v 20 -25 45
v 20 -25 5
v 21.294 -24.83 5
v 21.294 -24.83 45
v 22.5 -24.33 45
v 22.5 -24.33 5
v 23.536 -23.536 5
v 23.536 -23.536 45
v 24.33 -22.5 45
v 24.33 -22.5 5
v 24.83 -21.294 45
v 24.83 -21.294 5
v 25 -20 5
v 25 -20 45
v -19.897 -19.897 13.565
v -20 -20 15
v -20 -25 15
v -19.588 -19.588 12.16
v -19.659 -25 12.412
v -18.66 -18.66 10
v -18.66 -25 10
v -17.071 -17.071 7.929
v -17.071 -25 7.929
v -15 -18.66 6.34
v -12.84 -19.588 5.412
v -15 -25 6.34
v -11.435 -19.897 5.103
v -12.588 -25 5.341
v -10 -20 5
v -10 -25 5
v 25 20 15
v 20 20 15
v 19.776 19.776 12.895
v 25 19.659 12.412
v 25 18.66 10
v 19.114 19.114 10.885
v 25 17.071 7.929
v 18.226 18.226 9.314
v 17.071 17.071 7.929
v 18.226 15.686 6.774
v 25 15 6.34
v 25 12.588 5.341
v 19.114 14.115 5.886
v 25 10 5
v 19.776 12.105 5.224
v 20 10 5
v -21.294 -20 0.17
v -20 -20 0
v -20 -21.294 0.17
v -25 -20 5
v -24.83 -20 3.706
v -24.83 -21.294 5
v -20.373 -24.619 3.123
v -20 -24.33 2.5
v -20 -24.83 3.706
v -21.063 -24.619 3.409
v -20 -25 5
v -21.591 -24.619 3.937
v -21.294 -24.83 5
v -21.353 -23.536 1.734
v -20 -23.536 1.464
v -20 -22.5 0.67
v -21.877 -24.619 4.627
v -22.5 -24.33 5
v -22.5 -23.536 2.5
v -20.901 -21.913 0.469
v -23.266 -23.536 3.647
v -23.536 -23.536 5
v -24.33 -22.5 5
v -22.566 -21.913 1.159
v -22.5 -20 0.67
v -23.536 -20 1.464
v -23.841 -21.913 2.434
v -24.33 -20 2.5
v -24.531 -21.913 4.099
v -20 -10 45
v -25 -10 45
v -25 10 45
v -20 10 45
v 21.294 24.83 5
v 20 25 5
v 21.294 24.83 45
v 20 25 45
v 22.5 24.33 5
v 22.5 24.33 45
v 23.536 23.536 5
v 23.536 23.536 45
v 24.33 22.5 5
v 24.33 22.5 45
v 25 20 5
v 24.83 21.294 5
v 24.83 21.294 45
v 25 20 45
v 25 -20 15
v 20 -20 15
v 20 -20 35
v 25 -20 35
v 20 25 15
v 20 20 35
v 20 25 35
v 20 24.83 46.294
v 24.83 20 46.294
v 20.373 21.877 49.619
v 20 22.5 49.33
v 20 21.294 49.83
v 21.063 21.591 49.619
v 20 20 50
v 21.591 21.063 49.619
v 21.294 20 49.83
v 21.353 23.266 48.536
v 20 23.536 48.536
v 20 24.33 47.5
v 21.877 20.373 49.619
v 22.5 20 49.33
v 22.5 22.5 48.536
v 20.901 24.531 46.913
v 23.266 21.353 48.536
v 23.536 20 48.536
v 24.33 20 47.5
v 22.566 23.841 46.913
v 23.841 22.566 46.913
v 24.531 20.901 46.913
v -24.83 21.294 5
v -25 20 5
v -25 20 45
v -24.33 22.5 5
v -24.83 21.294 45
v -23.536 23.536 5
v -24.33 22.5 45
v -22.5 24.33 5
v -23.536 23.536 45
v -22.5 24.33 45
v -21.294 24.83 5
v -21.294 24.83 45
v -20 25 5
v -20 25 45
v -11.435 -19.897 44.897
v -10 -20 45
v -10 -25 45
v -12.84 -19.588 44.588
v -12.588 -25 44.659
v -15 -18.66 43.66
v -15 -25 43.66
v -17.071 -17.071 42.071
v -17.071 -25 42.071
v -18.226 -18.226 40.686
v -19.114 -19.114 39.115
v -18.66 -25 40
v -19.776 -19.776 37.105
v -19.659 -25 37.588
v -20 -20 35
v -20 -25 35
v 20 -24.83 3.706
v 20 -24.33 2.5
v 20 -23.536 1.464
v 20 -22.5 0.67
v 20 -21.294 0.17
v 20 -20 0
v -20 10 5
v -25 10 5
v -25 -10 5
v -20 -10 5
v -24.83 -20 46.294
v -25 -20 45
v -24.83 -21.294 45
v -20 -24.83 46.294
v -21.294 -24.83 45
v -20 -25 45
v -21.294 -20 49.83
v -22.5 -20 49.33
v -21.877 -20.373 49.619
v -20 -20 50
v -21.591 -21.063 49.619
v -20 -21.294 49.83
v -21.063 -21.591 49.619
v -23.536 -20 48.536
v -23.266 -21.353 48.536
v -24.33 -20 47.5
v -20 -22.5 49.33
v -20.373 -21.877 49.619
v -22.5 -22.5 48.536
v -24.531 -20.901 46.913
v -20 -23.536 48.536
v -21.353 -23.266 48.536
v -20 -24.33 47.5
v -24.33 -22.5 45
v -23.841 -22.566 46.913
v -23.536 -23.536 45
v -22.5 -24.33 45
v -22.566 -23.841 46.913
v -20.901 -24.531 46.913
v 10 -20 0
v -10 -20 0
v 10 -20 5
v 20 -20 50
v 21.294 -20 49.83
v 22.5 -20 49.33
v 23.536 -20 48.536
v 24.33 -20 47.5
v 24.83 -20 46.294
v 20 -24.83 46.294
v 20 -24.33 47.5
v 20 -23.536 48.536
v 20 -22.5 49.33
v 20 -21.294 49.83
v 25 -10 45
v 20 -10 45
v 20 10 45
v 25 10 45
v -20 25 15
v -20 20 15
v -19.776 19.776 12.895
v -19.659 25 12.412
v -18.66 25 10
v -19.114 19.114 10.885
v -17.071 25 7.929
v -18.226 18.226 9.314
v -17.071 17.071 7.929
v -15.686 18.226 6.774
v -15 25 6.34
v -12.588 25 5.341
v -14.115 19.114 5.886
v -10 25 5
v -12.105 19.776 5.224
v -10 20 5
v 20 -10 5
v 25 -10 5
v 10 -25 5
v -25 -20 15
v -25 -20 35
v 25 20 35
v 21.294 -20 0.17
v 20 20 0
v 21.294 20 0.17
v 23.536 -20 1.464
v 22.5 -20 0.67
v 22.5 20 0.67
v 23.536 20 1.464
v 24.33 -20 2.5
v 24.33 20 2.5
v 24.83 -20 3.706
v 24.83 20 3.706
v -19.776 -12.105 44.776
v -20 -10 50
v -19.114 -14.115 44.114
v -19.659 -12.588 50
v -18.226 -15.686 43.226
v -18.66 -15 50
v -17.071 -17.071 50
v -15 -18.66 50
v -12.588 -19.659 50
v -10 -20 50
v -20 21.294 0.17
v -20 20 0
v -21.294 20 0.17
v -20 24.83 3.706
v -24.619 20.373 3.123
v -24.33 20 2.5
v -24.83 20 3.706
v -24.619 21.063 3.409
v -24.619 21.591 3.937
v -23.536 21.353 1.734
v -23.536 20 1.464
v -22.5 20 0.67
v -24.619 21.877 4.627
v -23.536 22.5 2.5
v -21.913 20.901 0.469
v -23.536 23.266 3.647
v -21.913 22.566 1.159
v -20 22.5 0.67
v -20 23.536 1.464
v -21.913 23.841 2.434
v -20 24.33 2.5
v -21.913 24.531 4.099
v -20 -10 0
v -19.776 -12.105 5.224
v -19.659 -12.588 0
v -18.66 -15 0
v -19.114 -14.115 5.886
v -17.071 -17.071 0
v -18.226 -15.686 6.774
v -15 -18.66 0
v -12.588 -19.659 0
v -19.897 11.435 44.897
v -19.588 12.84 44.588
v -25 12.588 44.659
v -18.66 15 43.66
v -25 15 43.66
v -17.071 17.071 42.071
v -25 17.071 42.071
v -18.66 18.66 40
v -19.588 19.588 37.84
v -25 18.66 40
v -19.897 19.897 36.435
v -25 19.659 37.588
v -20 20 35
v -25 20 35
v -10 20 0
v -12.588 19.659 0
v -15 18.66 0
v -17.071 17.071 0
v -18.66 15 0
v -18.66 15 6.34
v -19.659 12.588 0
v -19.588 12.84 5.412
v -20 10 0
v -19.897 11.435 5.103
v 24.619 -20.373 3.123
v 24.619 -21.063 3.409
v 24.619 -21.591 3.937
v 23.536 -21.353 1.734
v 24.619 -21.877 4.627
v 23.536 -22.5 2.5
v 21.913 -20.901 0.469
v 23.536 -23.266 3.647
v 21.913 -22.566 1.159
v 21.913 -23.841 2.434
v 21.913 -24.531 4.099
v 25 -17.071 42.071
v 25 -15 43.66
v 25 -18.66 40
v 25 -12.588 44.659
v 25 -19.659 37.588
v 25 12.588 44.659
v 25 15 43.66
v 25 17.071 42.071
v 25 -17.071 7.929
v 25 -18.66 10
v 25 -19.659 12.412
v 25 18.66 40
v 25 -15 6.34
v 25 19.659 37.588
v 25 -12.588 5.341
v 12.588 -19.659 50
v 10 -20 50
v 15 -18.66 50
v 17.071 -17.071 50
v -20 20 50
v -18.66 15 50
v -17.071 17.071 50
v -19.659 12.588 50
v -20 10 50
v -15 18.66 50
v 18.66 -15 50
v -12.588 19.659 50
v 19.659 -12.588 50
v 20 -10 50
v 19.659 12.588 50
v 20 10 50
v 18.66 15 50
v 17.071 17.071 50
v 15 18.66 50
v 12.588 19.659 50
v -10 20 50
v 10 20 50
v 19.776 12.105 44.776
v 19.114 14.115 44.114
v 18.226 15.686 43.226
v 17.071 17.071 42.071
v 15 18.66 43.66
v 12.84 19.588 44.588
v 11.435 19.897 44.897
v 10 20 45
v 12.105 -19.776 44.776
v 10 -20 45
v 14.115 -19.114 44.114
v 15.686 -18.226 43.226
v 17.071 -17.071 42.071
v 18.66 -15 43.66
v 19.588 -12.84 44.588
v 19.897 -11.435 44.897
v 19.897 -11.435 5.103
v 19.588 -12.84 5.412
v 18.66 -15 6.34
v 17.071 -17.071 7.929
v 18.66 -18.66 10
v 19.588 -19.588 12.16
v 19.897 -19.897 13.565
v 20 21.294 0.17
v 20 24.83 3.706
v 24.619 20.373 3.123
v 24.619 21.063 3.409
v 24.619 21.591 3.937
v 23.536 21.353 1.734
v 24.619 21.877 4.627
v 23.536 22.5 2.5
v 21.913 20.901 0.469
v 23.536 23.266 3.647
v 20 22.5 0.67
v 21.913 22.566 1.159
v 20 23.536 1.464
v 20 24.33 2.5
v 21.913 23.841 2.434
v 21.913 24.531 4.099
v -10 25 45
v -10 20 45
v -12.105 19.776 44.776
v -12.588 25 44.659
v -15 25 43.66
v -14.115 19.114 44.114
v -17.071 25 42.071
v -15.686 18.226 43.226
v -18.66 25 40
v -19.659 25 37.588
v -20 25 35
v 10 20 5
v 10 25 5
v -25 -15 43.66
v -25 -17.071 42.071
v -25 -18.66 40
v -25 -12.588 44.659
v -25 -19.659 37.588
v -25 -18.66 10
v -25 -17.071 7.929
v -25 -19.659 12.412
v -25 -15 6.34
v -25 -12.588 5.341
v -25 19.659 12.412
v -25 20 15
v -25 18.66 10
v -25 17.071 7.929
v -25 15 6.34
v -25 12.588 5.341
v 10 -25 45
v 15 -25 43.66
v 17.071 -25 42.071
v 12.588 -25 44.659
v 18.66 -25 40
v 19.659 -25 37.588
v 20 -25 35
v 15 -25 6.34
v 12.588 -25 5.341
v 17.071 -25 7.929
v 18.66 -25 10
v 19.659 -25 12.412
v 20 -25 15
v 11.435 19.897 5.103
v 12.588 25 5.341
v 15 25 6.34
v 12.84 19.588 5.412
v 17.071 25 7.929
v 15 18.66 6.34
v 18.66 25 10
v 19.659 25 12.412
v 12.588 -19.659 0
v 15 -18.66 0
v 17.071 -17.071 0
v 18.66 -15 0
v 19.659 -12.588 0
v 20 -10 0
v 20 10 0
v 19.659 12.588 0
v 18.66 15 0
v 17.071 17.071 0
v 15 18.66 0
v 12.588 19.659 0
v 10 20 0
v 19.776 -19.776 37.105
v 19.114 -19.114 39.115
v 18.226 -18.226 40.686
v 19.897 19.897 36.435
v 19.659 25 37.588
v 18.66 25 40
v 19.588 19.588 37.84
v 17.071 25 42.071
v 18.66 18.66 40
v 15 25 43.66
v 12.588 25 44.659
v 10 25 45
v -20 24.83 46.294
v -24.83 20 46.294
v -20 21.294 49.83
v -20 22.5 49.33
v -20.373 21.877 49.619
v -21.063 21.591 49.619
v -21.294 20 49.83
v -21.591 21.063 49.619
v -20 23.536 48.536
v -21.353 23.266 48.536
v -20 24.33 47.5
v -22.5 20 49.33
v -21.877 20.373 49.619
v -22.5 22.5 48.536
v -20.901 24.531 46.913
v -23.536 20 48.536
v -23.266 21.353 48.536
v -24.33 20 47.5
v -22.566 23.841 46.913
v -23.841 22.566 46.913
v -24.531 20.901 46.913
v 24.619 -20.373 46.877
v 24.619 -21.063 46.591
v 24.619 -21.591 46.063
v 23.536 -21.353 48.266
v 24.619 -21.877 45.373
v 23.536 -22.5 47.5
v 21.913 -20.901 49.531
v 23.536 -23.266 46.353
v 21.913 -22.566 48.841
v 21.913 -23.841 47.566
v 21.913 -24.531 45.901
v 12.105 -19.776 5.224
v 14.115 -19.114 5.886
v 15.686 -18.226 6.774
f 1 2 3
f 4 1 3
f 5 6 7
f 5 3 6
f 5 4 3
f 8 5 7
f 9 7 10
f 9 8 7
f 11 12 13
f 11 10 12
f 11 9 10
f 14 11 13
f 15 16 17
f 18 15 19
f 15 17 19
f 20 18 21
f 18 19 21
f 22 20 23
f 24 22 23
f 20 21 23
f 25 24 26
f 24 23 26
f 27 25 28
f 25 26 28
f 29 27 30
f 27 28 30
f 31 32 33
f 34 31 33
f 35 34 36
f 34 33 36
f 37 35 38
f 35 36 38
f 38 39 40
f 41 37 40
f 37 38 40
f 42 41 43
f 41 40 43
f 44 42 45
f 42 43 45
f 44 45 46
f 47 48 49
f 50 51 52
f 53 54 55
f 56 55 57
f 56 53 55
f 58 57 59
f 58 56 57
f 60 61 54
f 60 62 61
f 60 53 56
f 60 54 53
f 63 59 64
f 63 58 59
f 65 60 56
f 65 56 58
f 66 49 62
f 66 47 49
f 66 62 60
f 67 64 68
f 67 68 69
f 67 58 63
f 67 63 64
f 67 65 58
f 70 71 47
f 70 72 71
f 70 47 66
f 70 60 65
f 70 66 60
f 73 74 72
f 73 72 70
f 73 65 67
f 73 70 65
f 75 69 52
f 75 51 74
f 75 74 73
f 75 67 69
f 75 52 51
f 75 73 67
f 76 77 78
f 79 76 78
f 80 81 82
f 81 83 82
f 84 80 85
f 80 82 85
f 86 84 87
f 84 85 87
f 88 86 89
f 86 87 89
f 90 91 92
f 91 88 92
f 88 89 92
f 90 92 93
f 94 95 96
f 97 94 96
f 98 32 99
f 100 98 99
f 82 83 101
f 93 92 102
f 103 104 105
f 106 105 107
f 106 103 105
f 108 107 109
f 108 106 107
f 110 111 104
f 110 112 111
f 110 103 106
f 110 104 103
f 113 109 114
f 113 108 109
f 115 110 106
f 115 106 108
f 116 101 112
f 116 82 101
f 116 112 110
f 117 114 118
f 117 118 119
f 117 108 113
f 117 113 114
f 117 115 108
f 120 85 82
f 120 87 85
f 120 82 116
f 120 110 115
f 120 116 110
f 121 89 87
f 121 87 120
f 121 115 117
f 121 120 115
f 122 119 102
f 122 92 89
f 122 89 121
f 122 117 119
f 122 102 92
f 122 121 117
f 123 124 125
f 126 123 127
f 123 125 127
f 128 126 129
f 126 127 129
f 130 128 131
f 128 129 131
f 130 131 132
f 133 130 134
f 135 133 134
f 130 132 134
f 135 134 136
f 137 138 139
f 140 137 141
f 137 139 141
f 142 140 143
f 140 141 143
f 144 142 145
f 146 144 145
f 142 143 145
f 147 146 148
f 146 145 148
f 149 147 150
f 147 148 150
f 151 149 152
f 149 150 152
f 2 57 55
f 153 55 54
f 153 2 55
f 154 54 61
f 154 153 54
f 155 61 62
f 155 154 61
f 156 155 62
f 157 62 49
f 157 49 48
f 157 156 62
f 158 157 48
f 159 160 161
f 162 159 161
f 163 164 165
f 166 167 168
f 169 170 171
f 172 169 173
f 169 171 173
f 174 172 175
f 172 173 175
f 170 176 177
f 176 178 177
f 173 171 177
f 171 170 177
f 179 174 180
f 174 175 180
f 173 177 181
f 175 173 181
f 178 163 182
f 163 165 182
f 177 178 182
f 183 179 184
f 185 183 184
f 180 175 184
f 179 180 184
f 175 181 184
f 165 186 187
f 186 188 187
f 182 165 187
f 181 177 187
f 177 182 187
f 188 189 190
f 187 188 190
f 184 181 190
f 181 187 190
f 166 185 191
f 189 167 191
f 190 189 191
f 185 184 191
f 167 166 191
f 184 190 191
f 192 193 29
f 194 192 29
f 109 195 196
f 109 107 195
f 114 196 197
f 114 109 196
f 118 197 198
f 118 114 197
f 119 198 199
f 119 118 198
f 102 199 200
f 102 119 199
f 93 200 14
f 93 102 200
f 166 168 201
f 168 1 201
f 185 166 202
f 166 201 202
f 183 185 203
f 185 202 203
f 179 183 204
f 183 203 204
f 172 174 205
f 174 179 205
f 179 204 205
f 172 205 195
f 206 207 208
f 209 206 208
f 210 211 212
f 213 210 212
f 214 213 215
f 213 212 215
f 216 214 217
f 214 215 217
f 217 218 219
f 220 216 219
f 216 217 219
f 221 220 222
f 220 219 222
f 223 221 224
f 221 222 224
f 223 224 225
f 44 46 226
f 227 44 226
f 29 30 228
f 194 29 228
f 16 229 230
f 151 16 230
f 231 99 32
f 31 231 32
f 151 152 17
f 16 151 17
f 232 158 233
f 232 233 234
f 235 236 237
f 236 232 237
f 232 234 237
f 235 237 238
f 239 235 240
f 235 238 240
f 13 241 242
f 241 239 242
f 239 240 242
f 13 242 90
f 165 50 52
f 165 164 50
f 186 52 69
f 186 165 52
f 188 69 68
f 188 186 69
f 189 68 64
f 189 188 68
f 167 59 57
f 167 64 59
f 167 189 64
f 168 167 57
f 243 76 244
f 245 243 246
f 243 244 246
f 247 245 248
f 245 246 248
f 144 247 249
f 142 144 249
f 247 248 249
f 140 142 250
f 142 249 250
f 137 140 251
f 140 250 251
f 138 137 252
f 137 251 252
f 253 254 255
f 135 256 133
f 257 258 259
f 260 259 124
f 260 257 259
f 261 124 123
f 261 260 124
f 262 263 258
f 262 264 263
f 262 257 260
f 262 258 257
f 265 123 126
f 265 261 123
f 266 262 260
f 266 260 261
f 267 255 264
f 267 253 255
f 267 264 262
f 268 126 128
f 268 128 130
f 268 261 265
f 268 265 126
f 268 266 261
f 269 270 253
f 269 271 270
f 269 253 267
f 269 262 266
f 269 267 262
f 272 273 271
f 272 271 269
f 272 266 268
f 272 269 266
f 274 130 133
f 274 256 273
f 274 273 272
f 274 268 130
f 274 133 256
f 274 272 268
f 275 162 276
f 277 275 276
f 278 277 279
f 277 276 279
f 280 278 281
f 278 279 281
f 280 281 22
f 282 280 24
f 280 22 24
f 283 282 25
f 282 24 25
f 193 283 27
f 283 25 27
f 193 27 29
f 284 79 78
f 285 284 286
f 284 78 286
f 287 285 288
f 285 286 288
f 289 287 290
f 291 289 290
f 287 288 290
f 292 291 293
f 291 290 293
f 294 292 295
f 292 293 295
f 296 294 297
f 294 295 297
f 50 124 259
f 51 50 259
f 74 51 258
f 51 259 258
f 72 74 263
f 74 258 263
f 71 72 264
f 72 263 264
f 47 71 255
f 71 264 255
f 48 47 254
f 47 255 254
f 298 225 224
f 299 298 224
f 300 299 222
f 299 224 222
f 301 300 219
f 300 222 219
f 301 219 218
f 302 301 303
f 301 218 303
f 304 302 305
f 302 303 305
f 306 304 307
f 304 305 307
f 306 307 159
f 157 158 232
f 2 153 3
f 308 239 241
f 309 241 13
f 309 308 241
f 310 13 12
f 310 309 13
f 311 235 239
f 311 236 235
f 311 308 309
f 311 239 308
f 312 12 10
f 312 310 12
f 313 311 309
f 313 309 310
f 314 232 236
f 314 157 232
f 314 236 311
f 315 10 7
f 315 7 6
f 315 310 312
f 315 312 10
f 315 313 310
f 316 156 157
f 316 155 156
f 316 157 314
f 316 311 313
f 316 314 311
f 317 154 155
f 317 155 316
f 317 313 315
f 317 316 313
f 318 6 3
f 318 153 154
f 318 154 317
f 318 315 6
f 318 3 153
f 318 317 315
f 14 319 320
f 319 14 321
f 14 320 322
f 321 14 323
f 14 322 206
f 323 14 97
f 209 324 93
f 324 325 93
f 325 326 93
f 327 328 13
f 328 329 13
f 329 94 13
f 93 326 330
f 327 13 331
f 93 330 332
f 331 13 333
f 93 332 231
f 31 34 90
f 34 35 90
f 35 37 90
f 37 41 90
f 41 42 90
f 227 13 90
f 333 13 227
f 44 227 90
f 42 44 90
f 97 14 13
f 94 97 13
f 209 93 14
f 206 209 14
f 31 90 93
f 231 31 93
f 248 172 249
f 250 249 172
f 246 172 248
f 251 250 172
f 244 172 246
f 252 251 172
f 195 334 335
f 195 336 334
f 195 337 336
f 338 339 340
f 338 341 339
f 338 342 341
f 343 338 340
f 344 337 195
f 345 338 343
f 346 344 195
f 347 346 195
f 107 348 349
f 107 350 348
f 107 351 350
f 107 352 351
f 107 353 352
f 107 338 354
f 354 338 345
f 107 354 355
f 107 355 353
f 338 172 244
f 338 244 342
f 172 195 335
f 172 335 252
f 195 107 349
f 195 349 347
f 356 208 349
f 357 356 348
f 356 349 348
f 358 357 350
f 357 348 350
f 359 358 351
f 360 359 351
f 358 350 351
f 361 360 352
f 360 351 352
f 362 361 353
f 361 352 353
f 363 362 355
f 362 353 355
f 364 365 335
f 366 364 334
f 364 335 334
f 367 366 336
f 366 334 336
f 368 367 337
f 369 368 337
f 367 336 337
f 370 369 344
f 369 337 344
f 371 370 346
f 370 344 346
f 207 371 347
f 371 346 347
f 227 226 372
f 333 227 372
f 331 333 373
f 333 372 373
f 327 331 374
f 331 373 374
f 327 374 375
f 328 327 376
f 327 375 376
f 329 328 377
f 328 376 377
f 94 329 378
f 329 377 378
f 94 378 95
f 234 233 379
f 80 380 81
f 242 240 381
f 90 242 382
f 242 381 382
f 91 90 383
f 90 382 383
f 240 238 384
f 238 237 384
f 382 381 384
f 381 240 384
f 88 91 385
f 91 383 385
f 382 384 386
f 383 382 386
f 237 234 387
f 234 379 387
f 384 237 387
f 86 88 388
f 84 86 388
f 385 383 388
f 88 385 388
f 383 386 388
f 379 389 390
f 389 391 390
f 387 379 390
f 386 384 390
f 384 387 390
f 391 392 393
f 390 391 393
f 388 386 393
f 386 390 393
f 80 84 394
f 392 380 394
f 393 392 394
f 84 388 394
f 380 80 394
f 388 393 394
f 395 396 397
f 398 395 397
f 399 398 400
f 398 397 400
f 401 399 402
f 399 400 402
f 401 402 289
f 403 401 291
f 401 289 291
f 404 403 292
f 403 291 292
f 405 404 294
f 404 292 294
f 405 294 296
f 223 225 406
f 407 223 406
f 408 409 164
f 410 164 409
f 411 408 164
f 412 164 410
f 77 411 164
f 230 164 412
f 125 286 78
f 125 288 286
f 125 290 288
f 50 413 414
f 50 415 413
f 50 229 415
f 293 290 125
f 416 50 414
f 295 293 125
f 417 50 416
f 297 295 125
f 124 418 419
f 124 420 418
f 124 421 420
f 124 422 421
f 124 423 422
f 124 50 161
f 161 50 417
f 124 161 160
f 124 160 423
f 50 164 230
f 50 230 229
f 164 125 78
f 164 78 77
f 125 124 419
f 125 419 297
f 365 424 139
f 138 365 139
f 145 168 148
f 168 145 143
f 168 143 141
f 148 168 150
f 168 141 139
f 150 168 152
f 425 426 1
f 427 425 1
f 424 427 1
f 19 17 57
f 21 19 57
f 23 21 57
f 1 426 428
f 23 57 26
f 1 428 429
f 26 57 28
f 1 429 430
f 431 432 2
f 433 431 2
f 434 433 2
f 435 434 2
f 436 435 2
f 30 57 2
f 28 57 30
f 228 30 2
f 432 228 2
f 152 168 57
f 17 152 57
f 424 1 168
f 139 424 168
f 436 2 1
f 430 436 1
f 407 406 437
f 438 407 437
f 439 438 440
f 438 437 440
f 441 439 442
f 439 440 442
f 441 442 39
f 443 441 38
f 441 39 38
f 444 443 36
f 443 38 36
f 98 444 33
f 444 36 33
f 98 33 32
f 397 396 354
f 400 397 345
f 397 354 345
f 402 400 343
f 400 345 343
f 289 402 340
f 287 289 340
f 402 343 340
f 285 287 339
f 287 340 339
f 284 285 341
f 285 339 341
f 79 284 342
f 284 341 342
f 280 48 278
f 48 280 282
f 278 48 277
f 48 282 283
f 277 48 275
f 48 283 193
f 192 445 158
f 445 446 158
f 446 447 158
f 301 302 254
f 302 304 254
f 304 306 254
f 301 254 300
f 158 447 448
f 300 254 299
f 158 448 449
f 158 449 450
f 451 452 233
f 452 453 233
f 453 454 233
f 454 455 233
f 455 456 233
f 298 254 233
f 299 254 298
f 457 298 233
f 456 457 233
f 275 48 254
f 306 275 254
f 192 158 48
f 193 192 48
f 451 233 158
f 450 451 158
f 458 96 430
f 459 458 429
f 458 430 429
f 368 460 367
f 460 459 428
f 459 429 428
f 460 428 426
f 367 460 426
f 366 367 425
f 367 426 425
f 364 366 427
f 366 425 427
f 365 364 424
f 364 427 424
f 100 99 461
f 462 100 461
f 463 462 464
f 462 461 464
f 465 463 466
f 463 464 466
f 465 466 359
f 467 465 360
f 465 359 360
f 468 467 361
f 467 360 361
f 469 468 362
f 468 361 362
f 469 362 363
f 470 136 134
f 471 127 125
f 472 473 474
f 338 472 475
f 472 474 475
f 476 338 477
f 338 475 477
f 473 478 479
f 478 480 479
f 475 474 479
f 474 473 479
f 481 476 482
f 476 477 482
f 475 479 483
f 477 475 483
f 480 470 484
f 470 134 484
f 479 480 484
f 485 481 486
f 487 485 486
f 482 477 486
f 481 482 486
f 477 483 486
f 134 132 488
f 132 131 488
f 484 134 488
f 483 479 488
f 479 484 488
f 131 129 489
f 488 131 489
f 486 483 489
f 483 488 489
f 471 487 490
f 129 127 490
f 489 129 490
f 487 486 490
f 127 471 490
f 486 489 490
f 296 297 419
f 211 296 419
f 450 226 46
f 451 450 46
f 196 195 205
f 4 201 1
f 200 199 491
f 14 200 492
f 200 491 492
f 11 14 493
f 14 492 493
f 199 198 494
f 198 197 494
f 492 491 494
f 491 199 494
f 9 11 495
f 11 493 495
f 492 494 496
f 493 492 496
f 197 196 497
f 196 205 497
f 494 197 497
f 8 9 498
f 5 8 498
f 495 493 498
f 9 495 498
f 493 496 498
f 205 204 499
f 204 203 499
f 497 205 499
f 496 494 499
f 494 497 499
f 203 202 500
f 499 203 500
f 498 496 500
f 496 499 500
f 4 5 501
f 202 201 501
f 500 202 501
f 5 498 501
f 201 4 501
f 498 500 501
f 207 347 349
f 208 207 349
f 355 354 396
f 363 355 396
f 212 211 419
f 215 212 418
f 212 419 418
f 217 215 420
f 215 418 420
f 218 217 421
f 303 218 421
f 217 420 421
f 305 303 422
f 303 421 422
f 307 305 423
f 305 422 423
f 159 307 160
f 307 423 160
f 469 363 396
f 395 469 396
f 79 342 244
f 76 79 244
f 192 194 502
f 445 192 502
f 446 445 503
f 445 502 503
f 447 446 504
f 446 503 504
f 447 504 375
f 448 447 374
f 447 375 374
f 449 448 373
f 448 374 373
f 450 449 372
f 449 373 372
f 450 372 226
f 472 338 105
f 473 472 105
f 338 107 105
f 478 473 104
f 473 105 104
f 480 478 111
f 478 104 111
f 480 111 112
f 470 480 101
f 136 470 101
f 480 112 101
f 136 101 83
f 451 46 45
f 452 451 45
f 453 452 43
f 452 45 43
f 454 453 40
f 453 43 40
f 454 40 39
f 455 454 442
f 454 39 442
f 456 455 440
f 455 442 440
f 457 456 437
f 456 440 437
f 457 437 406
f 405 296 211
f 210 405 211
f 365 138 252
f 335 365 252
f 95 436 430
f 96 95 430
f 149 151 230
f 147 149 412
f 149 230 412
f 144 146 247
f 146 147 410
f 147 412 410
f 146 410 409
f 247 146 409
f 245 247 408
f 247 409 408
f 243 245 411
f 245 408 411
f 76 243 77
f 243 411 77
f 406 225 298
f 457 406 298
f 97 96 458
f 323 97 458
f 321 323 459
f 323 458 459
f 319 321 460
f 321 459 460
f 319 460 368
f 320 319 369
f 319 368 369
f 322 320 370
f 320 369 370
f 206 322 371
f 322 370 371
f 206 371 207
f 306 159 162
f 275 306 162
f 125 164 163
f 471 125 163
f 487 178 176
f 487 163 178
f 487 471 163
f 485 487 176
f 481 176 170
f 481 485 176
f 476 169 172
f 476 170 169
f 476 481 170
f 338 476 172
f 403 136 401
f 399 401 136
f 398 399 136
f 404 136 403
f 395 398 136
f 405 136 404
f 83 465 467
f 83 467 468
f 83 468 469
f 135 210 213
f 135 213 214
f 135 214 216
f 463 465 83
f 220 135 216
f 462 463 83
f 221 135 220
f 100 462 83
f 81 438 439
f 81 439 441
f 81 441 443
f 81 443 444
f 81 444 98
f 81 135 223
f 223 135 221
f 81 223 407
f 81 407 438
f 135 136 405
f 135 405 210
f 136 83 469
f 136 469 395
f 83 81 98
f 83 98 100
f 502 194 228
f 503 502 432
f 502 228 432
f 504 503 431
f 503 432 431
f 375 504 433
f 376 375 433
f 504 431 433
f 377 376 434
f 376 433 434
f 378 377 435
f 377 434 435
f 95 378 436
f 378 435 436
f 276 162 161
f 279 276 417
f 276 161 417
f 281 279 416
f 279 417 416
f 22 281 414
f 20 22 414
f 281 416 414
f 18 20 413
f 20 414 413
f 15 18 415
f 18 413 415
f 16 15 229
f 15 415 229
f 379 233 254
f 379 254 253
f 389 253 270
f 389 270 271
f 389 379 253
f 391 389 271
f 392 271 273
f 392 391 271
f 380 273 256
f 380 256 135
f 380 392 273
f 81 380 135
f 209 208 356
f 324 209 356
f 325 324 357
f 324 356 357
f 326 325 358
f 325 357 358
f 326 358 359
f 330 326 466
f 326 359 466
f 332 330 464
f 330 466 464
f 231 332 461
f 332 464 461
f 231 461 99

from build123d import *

# Parameters (mm, degrees)
F0_W     = 50
F0_H     = 50
F1_DEPTH = 50
F3_DEPTH = 50.001
F5_DEPTH = 50.001
F7_DEPTH = 50.001
F8_R     = 4.99999


# Not quite as in the source:
# - a fillet or chamfer is up to 0.001 mm smaller than in the source, because OpenCascade refuses the exact size


with BuildPart() as f1:
    # F0 (on Top) → F1 (new body)
    with BuildSketch(Plane.XY):
        Rectangle(F0_W, F0_H)
    extrude(amount=F1_DEPTH)

    # F2 (on face) → F3 (cut, through all)
    with BuildSketch(Plane.XY.offset(50)):
        with BuildLine():
            ThreePointArc((20, 10), (17.0710678119, 17.0710678119), (10, 20))
            Line((10, 20), (-10, 20))
            ThreePointArc((-10, 20), (-17.0710678119, 17.0710678119), (-20, 10))
            Line((-20, 10), (-20, -10))
            ThreePointArc((-20, -10), (-17.0710678119, -17.0710678119), (-10, -20))
            Line((-10, -20), (10, -20))
            ThreePointArc((10, -20), (17.0710678119, -17.0710678119), (20, -10))
            Line((20, -10), (20, 10))
        make_face()
    extrude(amount=-F3_DEPTH, mode=Mode.SUBTRACT)

    # F4 (on face) → F5 (cut, through all)
    with BuildSketch(Plane(origin=(-25, 0, 0), x_dir=(0, -1, 0), z_dir=(-1, 0, 0))):
        with BuildLine():
            Line((10, 45), (-10, 45))
            ThreePointArc((-10, 45), (-17.0710678119, 42.0710678119), (-20, 35))
            Line((-20, 35), (-20, 15))
            ThreePointArc((-20, 15), (-17.0710678119, 7.9289321881), (-10, 5))
            Line((-10, 5), (10, 5))
            ThreePointArc((10, 5), (17.0710678119, 7.9289321881), (20, 15))
            Line((20, 15), (20, 35))
            ThreePointArc((20, 35), (17.0710678119, 42.0710678119), (10, 45))
        make_face()
    extrude(amount=-F5_DEPTH, mode=Mode.SUBTRACT)

    # F6 (on face) → F7 (cut, through all)
    with BuildSketch(Plane.XZ.offset(25)):
        with BuildLine():
            Line((10, 45), (-10, 45))
            ThreePointArc((-10, 45), (-17.0710678119, 42.0710678119), (-20, 35))
            Line((-20, 35), (-20, 15))
            ThreePointArc((-20, 15), (-17.0710678119, 7.9289321881), (-10, 5))
            Line((-10, 5), (10, 5))
            ThreePointArc((10, 5), (17.0710678119, 7.9289321881), (20, 15))
            Line((20, 15), (20, 35))
            ThreePointArc((20, 35), (17.0710678119, 42.0710678119), (10, 45))
        make_face()
    extrude(amount=-F7_DEPTH, mode=Mode.SUBTRACT)

    # F8 (radius 5 in the source; OpenCascade refuses exactly that, so slightly less here)
    f8_edges = [f1.edges().sort_by_distance(p)[0] for p in [
        (0, 25, 0),
        (-25, 0, 0),
        (0, -25, 0),
        (25, 0, 0),
        (25, 25, 25),
        (-25, 25, 25),
        (-25, -25, 25),
        (0, 25, 50),
        (-25, 0, 50),
        (0, -25, 50),
        (25, 0, 50),
        (25, -25, 25),
    ]]
    fillet(f8_edges, radius=F8_R)


solid = f1.part
